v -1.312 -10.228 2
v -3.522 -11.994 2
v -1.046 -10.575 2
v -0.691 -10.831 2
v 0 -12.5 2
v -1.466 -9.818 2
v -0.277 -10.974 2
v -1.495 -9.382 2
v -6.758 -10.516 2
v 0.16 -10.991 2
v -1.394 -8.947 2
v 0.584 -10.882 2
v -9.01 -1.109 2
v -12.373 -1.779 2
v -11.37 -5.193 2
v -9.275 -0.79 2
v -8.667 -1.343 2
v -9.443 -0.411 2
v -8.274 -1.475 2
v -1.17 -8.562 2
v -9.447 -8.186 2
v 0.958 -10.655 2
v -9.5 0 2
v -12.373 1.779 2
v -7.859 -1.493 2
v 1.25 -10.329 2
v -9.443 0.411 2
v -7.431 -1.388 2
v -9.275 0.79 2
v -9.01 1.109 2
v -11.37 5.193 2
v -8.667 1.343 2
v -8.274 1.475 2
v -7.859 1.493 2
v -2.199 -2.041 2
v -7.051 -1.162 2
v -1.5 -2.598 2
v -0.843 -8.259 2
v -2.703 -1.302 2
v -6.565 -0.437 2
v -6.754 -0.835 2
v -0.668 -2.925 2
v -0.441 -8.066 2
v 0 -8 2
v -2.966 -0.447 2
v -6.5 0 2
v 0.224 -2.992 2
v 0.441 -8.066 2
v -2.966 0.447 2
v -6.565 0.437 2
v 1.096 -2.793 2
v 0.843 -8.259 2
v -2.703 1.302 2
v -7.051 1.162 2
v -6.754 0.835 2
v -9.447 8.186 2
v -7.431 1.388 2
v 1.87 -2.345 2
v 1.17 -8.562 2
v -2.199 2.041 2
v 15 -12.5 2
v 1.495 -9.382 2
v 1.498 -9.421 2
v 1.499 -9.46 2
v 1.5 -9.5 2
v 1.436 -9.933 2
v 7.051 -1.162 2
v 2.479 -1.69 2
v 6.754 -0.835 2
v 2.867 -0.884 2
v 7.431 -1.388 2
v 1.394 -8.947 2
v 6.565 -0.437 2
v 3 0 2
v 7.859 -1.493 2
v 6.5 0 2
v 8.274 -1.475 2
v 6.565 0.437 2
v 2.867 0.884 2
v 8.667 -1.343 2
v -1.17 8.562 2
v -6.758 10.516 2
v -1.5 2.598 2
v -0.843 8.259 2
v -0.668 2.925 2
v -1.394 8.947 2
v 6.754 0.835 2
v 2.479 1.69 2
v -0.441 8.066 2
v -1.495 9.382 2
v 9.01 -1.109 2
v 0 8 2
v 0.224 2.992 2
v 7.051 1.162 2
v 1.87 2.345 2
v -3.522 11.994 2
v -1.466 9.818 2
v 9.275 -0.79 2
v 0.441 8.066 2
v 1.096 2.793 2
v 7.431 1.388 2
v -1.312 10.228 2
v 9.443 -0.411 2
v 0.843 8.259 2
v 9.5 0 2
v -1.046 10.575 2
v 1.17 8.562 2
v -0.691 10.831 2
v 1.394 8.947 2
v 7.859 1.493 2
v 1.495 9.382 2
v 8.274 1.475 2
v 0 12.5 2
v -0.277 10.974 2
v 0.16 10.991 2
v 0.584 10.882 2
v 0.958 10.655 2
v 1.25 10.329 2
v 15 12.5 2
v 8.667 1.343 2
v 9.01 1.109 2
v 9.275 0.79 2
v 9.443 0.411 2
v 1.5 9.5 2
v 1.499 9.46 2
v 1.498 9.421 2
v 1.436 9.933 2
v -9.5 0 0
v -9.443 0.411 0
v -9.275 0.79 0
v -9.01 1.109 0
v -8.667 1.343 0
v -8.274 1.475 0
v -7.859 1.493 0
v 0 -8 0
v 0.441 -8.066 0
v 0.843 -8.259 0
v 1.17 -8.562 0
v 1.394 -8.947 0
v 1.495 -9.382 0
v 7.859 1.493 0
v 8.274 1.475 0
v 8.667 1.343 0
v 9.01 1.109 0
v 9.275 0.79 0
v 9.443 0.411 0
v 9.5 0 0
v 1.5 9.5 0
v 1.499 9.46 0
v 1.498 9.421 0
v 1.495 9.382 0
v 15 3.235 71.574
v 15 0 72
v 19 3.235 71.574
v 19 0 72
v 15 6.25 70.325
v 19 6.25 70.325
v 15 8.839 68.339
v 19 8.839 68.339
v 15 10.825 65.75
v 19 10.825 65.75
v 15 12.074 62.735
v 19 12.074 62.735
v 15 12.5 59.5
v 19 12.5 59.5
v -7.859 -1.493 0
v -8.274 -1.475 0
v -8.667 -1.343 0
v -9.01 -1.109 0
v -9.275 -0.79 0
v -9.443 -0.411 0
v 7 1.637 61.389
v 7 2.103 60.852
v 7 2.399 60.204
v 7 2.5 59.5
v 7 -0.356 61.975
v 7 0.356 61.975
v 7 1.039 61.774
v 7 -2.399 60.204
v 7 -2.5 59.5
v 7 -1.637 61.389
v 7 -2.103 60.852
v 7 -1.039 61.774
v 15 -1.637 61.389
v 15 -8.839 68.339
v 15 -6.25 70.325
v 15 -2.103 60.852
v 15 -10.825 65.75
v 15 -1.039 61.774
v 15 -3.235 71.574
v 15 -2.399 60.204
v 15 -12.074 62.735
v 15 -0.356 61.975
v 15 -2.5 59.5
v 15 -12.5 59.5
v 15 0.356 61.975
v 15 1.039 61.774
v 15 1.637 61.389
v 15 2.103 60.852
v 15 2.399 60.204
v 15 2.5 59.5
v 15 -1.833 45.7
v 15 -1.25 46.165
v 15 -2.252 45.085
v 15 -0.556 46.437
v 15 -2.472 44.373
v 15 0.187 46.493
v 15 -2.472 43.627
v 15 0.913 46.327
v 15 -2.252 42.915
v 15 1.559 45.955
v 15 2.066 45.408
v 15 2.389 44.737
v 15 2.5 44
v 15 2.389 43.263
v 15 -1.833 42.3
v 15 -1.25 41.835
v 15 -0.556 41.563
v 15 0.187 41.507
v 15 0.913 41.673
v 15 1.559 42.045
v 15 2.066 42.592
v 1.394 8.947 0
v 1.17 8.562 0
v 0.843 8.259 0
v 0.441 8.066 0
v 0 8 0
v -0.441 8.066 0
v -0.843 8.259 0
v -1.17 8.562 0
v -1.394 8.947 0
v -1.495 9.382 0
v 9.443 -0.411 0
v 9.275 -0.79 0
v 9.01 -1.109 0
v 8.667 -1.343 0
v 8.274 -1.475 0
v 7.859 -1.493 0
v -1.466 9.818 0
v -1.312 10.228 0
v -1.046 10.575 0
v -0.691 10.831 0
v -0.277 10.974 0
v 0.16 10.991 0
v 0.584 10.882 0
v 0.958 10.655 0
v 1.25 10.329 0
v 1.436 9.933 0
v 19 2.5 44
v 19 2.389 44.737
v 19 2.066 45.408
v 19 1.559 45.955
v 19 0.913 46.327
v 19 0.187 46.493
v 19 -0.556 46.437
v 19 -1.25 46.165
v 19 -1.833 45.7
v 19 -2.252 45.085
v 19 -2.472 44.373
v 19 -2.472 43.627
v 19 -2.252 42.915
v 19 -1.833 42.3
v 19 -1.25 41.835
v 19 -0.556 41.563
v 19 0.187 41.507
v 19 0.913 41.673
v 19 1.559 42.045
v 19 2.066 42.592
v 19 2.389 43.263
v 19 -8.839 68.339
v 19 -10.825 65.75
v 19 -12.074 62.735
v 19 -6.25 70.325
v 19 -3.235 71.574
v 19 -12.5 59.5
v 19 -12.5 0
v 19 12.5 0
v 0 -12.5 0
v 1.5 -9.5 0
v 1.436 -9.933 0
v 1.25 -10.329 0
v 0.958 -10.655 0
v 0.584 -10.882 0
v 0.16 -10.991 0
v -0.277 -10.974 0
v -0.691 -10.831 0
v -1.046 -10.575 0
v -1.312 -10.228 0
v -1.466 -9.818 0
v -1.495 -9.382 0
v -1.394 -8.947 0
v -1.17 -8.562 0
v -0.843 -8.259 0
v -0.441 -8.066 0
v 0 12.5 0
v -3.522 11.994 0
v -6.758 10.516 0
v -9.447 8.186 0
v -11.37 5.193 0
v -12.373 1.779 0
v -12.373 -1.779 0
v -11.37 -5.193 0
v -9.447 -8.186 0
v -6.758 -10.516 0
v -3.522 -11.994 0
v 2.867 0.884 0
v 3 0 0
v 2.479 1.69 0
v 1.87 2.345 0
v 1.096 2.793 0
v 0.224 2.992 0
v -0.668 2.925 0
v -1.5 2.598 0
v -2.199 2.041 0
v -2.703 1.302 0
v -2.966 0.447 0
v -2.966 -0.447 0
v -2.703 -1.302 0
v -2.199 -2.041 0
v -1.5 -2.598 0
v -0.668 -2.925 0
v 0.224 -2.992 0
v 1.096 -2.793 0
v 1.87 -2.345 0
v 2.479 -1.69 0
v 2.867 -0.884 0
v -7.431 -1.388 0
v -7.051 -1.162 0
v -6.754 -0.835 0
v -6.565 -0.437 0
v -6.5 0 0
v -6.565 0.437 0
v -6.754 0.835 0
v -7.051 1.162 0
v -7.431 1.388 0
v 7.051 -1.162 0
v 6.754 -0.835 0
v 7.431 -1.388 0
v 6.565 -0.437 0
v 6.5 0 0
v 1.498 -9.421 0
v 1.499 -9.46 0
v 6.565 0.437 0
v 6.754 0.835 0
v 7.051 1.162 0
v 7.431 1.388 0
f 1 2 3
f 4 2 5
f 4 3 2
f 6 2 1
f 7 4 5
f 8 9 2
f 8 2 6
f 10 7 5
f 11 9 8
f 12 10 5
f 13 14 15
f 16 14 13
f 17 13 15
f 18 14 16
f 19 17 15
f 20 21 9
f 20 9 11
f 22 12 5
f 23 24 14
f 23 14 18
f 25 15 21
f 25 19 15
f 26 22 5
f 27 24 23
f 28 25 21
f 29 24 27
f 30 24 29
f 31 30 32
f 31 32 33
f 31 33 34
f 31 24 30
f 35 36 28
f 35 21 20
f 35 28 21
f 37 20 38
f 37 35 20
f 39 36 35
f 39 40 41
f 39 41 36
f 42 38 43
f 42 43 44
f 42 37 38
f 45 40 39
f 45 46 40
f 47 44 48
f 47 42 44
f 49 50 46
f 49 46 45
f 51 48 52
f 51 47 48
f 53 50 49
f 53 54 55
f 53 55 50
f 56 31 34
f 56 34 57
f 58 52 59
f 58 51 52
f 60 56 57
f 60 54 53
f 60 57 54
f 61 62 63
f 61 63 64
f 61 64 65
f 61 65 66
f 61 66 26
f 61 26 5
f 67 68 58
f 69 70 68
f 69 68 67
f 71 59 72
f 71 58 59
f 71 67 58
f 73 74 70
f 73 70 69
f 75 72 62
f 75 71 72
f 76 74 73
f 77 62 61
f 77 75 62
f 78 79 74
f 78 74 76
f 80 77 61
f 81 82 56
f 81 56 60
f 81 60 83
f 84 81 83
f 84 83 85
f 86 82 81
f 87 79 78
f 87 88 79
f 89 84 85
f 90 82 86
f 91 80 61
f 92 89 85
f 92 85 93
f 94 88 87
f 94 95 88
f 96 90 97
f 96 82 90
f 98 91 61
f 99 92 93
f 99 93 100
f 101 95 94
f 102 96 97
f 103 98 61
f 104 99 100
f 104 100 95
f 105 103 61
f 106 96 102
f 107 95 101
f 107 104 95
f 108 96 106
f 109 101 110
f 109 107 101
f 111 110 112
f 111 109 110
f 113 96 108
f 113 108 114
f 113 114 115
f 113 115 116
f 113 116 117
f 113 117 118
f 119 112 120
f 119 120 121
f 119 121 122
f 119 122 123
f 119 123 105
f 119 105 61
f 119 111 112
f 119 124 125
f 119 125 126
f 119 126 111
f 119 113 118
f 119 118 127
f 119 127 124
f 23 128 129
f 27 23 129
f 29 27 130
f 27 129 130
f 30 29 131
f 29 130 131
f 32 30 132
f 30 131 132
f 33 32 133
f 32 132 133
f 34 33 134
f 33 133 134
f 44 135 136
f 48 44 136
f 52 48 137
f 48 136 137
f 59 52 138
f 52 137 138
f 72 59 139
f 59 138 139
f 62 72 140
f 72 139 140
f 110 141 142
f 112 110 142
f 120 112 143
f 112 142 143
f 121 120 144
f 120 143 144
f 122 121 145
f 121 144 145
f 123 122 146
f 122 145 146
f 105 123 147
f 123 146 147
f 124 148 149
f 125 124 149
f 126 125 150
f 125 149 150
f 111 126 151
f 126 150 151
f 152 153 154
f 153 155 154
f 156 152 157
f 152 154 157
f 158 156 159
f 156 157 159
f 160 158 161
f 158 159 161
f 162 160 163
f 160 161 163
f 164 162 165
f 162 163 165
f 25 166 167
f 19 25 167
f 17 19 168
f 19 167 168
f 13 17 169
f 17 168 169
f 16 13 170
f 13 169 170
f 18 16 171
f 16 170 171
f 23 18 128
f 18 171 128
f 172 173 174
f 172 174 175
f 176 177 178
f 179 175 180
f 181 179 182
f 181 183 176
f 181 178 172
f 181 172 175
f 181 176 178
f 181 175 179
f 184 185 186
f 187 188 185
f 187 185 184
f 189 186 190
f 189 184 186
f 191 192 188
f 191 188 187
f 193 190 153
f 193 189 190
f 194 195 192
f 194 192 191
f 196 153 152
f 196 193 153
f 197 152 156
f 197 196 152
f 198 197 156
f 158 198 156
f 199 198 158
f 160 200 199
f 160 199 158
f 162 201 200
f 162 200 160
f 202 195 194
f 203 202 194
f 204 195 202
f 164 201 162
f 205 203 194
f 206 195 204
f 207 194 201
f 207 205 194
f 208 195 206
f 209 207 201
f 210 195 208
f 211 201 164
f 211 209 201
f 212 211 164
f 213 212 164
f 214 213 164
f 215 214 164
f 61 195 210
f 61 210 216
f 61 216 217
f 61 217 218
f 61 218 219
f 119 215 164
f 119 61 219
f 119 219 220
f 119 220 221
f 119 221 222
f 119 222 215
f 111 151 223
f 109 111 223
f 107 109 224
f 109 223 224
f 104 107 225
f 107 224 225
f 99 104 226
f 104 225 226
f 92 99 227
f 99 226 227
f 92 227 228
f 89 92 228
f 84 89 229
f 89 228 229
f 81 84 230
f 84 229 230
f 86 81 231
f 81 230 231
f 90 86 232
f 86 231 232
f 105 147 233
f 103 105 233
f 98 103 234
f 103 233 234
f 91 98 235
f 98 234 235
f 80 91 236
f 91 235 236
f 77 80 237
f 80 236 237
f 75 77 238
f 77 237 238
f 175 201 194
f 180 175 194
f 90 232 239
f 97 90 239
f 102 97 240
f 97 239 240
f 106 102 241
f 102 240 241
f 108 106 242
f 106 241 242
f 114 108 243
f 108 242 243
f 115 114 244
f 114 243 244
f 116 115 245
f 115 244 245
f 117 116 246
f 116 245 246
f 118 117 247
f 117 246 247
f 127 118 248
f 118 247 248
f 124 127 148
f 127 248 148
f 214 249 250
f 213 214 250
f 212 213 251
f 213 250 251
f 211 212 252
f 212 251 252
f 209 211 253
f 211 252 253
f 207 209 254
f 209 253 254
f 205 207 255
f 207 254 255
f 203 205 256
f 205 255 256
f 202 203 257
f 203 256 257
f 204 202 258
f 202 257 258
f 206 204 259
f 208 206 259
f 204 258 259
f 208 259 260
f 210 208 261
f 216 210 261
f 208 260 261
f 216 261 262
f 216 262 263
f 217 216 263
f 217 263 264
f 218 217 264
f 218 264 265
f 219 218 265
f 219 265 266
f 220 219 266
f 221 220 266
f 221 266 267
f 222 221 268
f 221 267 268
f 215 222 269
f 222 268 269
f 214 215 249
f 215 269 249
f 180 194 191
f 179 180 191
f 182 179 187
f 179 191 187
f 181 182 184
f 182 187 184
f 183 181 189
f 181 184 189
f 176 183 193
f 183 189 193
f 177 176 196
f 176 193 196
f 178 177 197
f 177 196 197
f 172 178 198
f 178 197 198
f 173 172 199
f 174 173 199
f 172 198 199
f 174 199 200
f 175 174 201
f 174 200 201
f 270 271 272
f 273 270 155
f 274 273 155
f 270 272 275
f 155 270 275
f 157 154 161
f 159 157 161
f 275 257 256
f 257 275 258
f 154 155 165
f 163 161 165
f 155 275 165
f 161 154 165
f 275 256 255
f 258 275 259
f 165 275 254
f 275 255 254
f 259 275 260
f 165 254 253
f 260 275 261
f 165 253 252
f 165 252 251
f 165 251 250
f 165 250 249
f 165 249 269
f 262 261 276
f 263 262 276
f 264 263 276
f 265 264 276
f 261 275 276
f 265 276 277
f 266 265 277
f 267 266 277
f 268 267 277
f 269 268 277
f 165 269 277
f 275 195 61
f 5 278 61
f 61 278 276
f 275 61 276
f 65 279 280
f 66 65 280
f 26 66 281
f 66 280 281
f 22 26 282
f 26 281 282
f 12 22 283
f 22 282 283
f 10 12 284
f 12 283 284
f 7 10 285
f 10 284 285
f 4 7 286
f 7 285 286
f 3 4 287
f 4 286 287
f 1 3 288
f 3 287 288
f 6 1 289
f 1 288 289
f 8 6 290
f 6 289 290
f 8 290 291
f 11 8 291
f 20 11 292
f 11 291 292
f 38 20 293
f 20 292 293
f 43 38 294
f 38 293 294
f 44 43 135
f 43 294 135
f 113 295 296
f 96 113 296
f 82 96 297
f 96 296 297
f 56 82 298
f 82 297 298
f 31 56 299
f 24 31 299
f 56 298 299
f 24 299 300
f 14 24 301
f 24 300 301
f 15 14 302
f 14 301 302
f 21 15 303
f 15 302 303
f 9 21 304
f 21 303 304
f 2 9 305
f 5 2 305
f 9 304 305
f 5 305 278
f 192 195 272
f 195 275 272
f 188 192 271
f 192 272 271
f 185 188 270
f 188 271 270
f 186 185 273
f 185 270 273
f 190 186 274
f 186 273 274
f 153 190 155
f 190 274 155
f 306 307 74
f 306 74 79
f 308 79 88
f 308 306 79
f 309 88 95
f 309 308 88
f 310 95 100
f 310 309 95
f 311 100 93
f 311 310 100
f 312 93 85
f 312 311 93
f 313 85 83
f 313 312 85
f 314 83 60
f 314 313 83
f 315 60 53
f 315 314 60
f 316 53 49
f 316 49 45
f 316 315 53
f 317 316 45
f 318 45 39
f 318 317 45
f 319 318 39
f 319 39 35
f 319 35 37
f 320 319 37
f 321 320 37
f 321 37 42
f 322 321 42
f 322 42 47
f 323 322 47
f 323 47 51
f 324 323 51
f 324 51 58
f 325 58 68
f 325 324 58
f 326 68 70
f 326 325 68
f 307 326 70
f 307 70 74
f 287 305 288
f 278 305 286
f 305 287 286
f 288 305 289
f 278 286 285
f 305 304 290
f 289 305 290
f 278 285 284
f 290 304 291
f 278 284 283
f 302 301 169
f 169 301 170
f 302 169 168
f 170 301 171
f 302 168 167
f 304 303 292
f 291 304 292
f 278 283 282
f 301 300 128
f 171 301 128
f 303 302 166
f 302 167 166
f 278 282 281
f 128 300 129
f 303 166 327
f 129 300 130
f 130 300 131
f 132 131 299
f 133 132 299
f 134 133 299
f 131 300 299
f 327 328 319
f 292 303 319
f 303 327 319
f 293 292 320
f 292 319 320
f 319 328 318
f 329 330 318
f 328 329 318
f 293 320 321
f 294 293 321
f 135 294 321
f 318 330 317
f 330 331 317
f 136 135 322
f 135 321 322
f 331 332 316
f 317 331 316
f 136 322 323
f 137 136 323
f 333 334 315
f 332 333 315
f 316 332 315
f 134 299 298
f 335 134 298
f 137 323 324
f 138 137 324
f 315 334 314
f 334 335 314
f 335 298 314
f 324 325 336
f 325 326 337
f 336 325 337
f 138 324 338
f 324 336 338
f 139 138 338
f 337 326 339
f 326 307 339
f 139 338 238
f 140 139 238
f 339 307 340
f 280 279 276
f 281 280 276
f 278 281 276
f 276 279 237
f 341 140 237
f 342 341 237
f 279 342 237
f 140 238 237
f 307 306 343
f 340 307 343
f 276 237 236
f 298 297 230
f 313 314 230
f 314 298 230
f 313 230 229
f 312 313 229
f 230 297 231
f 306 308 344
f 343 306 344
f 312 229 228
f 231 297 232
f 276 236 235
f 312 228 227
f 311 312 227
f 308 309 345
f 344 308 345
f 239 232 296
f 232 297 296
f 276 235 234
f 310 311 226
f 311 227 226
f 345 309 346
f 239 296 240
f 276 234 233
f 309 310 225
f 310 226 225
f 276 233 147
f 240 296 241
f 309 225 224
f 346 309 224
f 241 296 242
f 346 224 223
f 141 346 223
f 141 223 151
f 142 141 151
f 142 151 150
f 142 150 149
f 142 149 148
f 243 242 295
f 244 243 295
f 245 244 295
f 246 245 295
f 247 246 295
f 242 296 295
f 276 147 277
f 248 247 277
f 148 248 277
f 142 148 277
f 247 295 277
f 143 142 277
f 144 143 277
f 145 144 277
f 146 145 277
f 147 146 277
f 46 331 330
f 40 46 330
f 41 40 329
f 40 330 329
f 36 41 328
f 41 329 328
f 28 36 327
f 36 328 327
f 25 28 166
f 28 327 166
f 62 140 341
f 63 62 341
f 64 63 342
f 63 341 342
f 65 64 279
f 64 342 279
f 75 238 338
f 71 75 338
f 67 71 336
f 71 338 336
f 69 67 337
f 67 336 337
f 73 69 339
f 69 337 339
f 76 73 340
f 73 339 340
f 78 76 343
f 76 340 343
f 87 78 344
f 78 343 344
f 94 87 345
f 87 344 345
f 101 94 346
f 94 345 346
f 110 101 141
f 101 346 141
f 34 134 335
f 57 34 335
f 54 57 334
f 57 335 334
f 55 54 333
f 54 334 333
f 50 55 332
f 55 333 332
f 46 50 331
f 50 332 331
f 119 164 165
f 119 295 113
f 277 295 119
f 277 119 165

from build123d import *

# Parameters (mm, degrees)
F0_R     = 3
F1_DEPTH = 2
F2_W     = 4
F2_H     = 25
F3_DEPTH = 70
F5_DEPTH = 8
F6_R     = 12.49999
F7_R     = 2.5
F8_DEPTH = 4


# Not quite as in the source:
# - a fillet or chamfer is up to 0.001 mm smaller than in the source, because OpenCascade refuses the exact size
# - a feature names something its author has since deleted; it is built from what else it names


with BuildPart() as f1:
    # F0 (on Top) → F1 (new body)
    with BuildSketch(Plane.XY):
        with BuildLine():
            ThreePointArc((0, -12.5), (8.8388347648, -8.8388347648), (12.5, 0))
            ThreePointArc((12.5, 0), (8.8388347648, 8.8388347648), (0, 12.5))
            ThreePointArc((0, 12.5), (-12.5, 0), (0, -12.5))
        make_face()
        with BuildLine():
            ThreePointArc((1.4953181783, 9.3815789474), (7.2268777039, 6.1662175321), (9.5, 0))
            ThreePointArc((9.5, 0), (7.2268777039, -6.1662175321), (1.4953181783, -9.3815789474))
            ThreePointArc((1.4953181783, -9.3815789474), (1.4988290876, -9.4407432173), (1.5, -9.5))
            ThreePointArc((1.5, -9.5), (-0.0592567827, -10.9988290876), (-1.4953181783, -9.3815789474))
            ThreePointArc((-1.4953181783, -9.3815789474), (-7.2268777039, -6.1662175321), (-9.5, 0))
            ThreePointArc((-9.5, 0), (-7.2268777039, 6.1662175321), (-1.4953181783, 9.3815789474))
            ThreePointArc((-1.4953181783, 9.3815789474), (-0.0592567827, 10.9988290876), (1.5, 9.5))
            ThreePointArc((1.5, 9.5), (1.4988290876, 9.4407432173), (1.4953181783, 9.3815789474))
        make_face(mode=Mode.SUBTRACT)
        with BuildLine():
            ThreePointArc((0, 12.5), (8.8388347648, 8.8388347648), (12.5, 0))
            ThreePointArc((12.5, 0), (8.8388347648, -8.8388347648), (0, -12.5))
            Line((0, -12.5), (19, -12.5))
            Line((19, -12.5), (19, 12.5))
            Line((19, 12.5), (0, 12.5))
        make_face()
        with BuildLine():
            ThreePointArc((7.859375, -1.4933936552), (6.5, 0), (7.859375, 1.4933936552))
            ThreePointArc((7.859375, 1.4933936552), (5.1016100823, 6.1622702446), (1.34e-08, 8))
            ThreePointArc((1.34e-08, 8), (-5.101610072, 6.1622702532), (-7.859375, 1.4933936552))
            ThreePointArc((-7.859375, 1.4933936552), (-6.8907350407, 1.0097184013), (-6.5, 0))
            ThreePointArc((-6.5, 0), (-6.8907350407, -1.0097184013), (-7.859375, -1.4933936552))
            ThreePointArc((-7.859375, -1.4933936552), (-5.1016100771, -6.1622702489), (0, -8))
            ThreePointArc((0, -8), (5.1016100771, -6.1622702489), (7.859375, -1.4933936552))
        make_face()
        Circle(F0_R, mode=Mode.SUBTRACT)
        with BuildLine():
            ThreePointArc((7.859375, 1.4933936552), (9.0097184013, 1.1092649593), (9.5, 0))
            ThreePointArc((9.5, 0), (7.2268777039, 6.1662175321), (1.4953181783, 9.3815789474))
            ThreePointArc((1.4953181783, 9.3815789474), (1.0179313437, 8.3982669201), (1.34e-08, 8))
            ThreePointArc((1.34e-08, 8), (5.1016100823, 6.1622702446), (7.859375, 1.4933936552))
        make_face()
        with BuildLine():
            ThreePointArc((1.4953181783, -9.3815789474), (7.2268777039, -6.1662175321), (9.5, 0))
            ThreePointArc((9.5, 0), (9.0097184013, -1.1092649593), (7.859375, -1.4933936552))
            ThreePointArc((7.859375, -1.4933936552), (5.1016100771, -6.1622702489), (0, -8))
            ThreePointArc((0, -8), (1.0179313388, -8.3982669155), (1.4953181783, -9.3815789474))
        make_face()
        with BuildLine():
            ThreePointArc((1.34e-08, 8), (-1.0179313339, 8.3982669109), (-1.4953181783, 9.3815789474))
            ThreePointArc((-1.4953181783, 9.3815789474), (-7.2268777039, 6.1662175321), (-9.5, 0))
            ThreePointArc((-9.5, 0), (-9.0097184013, 1.1092649593), (-7.859375, 1.4933936552))
            ThreePointArc((-7.859375, 1.4933936552), (-5.101610072, 6.1622702532), (1.34e-08, 8))
        make_face()
        with BuildLine():
            ThreePointArc((-9.5, 0), (-7.2268777039, -6.1662175321), (-1.4953181783, -9.3815789474))
            ThreePointArc((-1.4953181783, -9.3815789474), (-1.0179313388, -8.3982669155), (0, -8))
            ThreePointArc((0, -8), (-5.1016100771, -6.1622702489), (-7.859375, -1.4933936552))
            ThreePointArc((-7.859375, -1.4933936552), (-9.0097184013, -1.1092649593), (-9.5, 0))
        make_face()
    extrude(amount=F1_DEPTH)

    # F2 (on face) → F3 (join)
    with BuildSketch(Plane.XY.offset(2)):
        with Locations((17, 0)):
            Rectangle(F2_W, F2_H)
    extrude(amount=F3_DEPTH)

    # F4 (on face) → F5 (join)
    with BuildSketch(Plane(origin=(15, 0, 0), x_dir=(0, -1, 0), z_dir=(-1, 0, 0))):
        with BuildLine():
            Line((-2.5, 59.5), (2.5, 59.5))
            ThreePointArc((2.5, 59.5), (0, 62), (-2.5, 59.5))
        make_face()
    extrude(amount=F5_DEPTH)

    # F6 (radius 12.5 in the source; OpenCascade refuses exactly that, so slightly less here)
    f6_edges = [f1.edges().sort_by_distance(p)[0] for p in [
        (17, -12.5, 72),
        (17, 12.5, 72),
    ]]
    fillet(f6_edges, radius=F6_R)

    # F7 (on face) → F8 (cut, through all)
    with BuildSketch(Plane.YZ.offset(19)):
        with Locations((0, 44)):
            Circle(F7_R)
    extrude(amount=-F8_DEPTH, mode=Mode.SUBTRACT)


solid = f1.part
